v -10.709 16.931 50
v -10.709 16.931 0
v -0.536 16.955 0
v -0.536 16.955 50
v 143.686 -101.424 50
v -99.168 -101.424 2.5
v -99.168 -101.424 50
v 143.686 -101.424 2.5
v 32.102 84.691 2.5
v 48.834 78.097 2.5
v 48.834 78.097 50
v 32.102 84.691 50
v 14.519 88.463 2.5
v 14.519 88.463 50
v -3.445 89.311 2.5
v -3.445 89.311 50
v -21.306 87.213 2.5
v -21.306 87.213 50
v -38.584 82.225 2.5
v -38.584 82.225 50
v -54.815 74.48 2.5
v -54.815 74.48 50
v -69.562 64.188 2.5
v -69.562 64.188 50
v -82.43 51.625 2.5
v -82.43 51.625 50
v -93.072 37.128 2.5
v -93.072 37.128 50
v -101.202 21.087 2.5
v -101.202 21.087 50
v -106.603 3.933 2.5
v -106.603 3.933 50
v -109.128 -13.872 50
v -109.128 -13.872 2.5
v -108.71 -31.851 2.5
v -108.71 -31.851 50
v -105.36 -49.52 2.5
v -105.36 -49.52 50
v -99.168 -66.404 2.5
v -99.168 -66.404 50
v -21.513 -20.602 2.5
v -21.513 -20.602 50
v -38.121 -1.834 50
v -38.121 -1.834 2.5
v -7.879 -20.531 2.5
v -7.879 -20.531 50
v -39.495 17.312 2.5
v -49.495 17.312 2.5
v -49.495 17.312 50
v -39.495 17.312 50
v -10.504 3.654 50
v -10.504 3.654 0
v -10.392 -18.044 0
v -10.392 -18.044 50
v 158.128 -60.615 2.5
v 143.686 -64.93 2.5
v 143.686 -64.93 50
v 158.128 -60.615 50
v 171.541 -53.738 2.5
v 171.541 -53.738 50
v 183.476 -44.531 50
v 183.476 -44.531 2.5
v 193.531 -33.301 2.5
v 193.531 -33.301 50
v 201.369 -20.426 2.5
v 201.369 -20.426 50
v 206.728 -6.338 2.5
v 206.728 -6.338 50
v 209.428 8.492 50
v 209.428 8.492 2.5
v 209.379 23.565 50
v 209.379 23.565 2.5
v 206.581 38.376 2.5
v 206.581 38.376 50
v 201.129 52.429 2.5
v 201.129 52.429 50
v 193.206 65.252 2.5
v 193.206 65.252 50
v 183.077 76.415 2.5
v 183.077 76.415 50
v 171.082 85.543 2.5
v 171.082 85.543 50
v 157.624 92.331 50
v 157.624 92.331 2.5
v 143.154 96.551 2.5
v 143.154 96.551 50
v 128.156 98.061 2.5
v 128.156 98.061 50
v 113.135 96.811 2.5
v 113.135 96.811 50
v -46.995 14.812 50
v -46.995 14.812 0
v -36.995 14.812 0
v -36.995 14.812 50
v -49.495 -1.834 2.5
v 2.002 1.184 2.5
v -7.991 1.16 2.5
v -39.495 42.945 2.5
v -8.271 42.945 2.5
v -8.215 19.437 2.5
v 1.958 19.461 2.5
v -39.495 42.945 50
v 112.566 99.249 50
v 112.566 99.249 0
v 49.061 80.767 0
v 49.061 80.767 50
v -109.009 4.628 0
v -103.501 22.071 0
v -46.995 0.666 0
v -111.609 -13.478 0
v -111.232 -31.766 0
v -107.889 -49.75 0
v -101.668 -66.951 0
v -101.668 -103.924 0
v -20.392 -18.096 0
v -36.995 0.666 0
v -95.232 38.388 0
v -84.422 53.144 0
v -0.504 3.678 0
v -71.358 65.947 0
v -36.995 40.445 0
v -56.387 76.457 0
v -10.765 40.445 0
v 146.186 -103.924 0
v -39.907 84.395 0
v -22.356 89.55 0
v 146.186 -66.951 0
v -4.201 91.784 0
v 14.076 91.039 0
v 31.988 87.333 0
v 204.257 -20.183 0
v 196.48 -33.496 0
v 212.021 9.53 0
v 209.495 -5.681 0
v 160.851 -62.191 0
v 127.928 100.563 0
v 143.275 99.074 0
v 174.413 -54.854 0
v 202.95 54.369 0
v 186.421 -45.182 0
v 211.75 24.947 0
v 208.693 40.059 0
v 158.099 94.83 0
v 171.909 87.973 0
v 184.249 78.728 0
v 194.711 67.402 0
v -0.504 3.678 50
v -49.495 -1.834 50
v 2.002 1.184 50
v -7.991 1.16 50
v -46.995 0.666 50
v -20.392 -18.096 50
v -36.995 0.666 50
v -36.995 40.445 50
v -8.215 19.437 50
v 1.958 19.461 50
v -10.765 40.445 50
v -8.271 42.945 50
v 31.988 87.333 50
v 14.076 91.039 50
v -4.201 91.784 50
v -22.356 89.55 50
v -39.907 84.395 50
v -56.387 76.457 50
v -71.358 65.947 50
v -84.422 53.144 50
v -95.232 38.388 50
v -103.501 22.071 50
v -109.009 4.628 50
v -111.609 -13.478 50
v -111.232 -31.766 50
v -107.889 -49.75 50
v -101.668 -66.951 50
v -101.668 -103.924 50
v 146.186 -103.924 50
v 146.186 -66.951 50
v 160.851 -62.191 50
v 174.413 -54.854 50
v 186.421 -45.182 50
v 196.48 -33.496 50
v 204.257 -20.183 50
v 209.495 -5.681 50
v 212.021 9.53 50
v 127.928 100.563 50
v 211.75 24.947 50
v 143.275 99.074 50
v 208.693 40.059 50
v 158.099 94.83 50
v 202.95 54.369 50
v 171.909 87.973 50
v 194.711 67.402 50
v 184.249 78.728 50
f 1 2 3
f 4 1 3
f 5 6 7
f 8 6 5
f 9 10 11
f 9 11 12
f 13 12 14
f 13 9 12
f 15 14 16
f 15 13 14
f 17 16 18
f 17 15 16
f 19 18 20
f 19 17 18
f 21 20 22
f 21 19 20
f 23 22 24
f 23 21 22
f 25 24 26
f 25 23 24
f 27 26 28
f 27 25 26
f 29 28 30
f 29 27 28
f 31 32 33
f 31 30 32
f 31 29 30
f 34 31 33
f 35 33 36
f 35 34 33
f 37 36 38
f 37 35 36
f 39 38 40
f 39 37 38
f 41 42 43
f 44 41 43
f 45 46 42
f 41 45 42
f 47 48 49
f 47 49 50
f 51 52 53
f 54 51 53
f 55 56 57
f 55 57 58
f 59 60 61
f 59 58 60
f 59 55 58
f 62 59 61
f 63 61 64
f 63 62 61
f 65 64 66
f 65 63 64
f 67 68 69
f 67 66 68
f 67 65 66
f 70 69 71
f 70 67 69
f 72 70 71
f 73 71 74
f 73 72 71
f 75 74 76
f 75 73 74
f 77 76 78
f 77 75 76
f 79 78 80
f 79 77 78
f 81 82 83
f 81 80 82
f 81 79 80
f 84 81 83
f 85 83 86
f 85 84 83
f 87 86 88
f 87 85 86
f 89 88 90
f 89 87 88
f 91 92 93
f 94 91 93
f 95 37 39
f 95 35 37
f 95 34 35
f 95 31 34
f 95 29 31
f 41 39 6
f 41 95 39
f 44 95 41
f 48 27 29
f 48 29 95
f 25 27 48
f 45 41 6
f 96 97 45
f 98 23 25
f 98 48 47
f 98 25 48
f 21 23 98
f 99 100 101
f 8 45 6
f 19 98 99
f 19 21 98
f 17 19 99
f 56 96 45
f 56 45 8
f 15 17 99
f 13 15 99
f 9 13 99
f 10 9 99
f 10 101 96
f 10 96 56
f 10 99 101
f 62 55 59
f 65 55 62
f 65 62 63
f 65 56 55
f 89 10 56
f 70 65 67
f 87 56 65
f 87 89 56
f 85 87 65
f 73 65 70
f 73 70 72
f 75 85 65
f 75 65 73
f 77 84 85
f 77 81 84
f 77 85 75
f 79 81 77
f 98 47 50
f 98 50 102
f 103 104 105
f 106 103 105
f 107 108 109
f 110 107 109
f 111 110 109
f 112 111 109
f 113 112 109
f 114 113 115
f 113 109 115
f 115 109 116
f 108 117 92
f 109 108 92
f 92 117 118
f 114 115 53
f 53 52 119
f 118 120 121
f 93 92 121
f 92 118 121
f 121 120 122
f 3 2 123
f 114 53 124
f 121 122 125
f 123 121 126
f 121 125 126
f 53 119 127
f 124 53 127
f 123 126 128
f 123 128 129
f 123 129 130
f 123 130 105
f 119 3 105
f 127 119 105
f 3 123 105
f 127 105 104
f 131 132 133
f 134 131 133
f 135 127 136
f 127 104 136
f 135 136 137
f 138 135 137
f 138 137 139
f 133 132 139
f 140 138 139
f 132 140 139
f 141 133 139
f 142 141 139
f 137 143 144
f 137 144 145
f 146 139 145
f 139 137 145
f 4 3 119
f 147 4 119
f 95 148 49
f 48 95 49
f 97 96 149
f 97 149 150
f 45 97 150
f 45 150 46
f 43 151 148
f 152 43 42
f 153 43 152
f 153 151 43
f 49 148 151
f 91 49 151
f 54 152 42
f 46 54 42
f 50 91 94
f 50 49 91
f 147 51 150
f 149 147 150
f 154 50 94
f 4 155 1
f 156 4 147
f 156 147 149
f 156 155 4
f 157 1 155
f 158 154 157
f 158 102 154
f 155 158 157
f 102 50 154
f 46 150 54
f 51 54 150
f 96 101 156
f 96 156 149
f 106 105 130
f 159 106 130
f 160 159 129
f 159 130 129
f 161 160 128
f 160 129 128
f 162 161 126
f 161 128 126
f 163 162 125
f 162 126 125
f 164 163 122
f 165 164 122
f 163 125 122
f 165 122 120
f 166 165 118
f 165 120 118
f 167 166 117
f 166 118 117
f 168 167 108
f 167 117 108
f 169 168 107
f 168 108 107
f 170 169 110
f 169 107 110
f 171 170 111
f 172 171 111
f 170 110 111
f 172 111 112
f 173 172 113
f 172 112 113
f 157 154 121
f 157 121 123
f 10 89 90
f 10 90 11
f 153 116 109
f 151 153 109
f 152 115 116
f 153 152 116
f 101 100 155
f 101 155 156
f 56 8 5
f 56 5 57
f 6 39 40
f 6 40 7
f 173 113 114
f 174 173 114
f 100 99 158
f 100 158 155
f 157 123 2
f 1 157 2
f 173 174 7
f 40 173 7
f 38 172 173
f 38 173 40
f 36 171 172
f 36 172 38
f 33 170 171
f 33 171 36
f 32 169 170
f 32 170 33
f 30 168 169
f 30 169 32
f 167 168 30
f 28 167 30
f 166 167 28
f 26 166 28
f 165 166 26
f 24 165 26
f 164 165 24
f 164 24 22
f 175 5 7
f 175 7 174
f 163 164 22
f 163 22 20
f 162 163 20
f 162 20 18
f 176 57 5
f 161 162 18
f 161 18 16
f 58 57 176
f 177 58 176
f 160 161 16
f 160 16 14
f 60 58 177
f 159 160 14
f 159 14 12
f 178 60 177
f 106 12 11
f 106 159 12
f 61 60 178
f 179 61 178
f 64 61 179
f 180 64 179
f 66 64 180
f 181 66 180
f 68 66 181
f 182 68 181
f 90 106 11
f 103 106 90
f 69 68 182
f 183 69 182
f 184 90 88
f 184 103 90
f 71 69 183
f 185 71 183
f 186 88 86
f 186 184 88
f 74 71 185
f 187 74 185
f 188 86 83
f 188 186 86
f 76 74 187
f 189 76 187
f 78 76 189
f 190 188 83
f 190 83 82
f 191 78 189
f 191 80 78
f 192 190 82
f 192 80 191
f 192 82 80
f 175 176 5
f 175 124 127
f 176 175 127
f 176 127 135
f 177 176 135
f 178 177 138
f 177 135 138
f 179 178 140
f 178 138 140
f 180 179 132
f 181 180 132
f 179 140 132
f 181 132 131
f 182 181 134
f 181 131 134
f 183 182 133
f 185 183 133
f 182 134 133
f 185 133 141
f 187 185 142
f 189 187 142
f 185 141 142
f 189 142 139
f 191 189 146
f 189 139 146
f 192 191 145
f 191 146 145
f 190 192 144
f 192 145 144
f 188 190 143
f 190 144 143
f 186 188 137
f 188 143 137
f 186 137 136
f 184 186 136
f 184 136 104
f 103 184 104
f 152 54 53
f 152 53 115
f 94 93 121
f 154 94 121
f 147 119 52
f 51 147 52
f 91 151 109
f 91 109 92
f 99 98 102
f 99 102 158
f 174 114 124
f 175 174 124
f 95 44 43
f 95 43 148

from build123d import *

# Parameters (mm, degrees)
F1_DEPTH = 50
F2_T     = -2.5


with BuildPart() as f1:
    # F0 (on Top) → F1 (new body)
    with BuildSketch(Plane.XY):
        with BuildLine():
            ThreePointArc((49.060916242, 80.7666611337), (-78.1512140744, 59.8120363605), (-101.6678459079, -66.9514853097))
            Line((-101.6678459079, -66.9514853097), (-101.6678459079, -103.9241496063))
            Line((-101.6678459079, -103.9241496063), (146.1859323948, -103.9241496063))
            Line((146.1859323948, -103.9241496063), (146.1859323948, -66.9514853097))
            ThreePointArc((146.1859323948, -66.9514853097), (210.5659380979, 32.5726496486), (112.5656791895, 99.2493909263))
            Line((112.5656791895, 99.2493909263), (49.060916242, 80.7666611337))
        make_face()
        Polygon((-20.3918665088, -18.0957990914), (-36.9947273911, 0.6663483047), (-46.9947273911, 0.6663483047), (-46.9947273911, 14.8120262139), (-36.9947273911, 14.8120262139), (-36.9947273911, 40.4454148785), (-10.7651253298, 40.4454148785), (-10.7090268836, 16.9306674714), (-0.5355780579, 16.9549379711), (-0.5039027498, 3.6776206944), (-10.5038742928, 3.6537640543), (-10.3919994277, -18.0442397964), align=None, mode=Mode.SUBTRACT)
    extrude(amount=F1_DEPTH)

    # F2
    f2_openings = [f1.faces().sort_by_distance(p)[0] for p in [
        (49.091744, -6.264169, 50),
    ]]
    offset(amount=F2_T, openings=f2_openings, kind=Kind.INTERSECTION)


solid = f1.part
